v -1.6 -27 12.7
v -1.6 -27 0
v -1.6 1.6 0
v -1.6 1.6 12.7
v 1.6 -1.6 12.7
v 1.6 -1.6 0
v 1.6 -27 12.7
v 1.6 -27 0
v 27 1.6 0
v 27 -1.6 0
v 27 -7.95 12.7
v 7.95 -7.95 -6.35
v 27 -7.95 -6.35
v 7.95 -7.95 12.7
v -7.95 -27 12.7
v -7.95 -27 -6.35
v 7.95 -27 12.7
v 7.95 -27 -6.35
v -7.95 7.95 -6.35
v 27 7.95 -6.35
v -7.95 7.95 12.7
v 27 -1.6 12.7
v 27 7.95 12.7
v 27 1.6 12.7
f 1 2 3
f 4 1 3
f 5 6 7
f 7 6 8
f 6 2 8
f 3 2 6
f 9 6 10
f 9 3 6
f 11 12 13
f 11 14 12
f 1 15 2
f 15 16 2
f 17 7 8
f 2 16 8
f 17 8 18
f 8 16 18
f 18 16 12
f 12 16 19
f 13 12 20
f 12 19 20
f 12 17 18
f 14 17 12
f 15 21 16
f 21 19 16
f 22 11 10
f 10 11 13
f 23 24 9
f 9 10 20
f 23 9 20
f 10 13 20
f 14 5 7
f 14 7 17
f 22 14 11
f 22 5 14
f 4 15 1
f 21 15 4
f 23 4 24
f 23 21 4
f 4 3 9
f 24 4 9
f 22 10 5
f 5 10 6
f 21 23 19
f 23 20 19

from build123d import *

# Parameters (mm, degrees)
F1_DEPTH = 6.35
F2_DEPTH = 12.7


# Not quite as in the source:
# - a feature names something its author has since deleted; it is built from what else it names


with BuildPart() as f1:
    # F0 (on Top) → F1 (new body)
    with BuildSketch(Plane.XY):
        Polygon((1.6, 1.6), (27, 1.6), (27, 7.95), (7.95, 7.95), (-7.95, 7.95), (-7.95, -7.95), (-7.95, -27), (-1.6, -27), (-1.6, -1.6), (-1.6, 1.6), align=None)
        Polygon((27, -7.95), (27, -1.6), (1.6, -1.6), (1.6, -27), (7.95, -27), (7.95, -7.95), align=None)
        Polygon((27, 0), (27, 1.6), (1.6, 1.6), (-1.6, 1.6), (-1.6, -1.6), (-1.6, -27), (0, -27), (1.6, -27), (1.6, -1.6), (27, -1.6), align=None)
    extrude(amount=-F1_DEPTH)

    # F0 (on Top) → F2 (join)
    with BuildSketch(Plane.XY):
        Polygon((1.6, 1.6), (27, 1.6), (27, 7.95), (7.95, 7.95), (-7.95, 7.95), (-7.95, -7.95), (-7.95, -27), (-1.6, -27), (-1.6, -1.6), (-1.6, 1.6), align=None)
        Polygon((27, -7.95), (27, -1.6), (1.6, -1.6), (1.6, -27), (7.95, -27), (7.95, -7.95), align=None)
    extrude(amount=F2_DEPTH)


solid = f1.part
